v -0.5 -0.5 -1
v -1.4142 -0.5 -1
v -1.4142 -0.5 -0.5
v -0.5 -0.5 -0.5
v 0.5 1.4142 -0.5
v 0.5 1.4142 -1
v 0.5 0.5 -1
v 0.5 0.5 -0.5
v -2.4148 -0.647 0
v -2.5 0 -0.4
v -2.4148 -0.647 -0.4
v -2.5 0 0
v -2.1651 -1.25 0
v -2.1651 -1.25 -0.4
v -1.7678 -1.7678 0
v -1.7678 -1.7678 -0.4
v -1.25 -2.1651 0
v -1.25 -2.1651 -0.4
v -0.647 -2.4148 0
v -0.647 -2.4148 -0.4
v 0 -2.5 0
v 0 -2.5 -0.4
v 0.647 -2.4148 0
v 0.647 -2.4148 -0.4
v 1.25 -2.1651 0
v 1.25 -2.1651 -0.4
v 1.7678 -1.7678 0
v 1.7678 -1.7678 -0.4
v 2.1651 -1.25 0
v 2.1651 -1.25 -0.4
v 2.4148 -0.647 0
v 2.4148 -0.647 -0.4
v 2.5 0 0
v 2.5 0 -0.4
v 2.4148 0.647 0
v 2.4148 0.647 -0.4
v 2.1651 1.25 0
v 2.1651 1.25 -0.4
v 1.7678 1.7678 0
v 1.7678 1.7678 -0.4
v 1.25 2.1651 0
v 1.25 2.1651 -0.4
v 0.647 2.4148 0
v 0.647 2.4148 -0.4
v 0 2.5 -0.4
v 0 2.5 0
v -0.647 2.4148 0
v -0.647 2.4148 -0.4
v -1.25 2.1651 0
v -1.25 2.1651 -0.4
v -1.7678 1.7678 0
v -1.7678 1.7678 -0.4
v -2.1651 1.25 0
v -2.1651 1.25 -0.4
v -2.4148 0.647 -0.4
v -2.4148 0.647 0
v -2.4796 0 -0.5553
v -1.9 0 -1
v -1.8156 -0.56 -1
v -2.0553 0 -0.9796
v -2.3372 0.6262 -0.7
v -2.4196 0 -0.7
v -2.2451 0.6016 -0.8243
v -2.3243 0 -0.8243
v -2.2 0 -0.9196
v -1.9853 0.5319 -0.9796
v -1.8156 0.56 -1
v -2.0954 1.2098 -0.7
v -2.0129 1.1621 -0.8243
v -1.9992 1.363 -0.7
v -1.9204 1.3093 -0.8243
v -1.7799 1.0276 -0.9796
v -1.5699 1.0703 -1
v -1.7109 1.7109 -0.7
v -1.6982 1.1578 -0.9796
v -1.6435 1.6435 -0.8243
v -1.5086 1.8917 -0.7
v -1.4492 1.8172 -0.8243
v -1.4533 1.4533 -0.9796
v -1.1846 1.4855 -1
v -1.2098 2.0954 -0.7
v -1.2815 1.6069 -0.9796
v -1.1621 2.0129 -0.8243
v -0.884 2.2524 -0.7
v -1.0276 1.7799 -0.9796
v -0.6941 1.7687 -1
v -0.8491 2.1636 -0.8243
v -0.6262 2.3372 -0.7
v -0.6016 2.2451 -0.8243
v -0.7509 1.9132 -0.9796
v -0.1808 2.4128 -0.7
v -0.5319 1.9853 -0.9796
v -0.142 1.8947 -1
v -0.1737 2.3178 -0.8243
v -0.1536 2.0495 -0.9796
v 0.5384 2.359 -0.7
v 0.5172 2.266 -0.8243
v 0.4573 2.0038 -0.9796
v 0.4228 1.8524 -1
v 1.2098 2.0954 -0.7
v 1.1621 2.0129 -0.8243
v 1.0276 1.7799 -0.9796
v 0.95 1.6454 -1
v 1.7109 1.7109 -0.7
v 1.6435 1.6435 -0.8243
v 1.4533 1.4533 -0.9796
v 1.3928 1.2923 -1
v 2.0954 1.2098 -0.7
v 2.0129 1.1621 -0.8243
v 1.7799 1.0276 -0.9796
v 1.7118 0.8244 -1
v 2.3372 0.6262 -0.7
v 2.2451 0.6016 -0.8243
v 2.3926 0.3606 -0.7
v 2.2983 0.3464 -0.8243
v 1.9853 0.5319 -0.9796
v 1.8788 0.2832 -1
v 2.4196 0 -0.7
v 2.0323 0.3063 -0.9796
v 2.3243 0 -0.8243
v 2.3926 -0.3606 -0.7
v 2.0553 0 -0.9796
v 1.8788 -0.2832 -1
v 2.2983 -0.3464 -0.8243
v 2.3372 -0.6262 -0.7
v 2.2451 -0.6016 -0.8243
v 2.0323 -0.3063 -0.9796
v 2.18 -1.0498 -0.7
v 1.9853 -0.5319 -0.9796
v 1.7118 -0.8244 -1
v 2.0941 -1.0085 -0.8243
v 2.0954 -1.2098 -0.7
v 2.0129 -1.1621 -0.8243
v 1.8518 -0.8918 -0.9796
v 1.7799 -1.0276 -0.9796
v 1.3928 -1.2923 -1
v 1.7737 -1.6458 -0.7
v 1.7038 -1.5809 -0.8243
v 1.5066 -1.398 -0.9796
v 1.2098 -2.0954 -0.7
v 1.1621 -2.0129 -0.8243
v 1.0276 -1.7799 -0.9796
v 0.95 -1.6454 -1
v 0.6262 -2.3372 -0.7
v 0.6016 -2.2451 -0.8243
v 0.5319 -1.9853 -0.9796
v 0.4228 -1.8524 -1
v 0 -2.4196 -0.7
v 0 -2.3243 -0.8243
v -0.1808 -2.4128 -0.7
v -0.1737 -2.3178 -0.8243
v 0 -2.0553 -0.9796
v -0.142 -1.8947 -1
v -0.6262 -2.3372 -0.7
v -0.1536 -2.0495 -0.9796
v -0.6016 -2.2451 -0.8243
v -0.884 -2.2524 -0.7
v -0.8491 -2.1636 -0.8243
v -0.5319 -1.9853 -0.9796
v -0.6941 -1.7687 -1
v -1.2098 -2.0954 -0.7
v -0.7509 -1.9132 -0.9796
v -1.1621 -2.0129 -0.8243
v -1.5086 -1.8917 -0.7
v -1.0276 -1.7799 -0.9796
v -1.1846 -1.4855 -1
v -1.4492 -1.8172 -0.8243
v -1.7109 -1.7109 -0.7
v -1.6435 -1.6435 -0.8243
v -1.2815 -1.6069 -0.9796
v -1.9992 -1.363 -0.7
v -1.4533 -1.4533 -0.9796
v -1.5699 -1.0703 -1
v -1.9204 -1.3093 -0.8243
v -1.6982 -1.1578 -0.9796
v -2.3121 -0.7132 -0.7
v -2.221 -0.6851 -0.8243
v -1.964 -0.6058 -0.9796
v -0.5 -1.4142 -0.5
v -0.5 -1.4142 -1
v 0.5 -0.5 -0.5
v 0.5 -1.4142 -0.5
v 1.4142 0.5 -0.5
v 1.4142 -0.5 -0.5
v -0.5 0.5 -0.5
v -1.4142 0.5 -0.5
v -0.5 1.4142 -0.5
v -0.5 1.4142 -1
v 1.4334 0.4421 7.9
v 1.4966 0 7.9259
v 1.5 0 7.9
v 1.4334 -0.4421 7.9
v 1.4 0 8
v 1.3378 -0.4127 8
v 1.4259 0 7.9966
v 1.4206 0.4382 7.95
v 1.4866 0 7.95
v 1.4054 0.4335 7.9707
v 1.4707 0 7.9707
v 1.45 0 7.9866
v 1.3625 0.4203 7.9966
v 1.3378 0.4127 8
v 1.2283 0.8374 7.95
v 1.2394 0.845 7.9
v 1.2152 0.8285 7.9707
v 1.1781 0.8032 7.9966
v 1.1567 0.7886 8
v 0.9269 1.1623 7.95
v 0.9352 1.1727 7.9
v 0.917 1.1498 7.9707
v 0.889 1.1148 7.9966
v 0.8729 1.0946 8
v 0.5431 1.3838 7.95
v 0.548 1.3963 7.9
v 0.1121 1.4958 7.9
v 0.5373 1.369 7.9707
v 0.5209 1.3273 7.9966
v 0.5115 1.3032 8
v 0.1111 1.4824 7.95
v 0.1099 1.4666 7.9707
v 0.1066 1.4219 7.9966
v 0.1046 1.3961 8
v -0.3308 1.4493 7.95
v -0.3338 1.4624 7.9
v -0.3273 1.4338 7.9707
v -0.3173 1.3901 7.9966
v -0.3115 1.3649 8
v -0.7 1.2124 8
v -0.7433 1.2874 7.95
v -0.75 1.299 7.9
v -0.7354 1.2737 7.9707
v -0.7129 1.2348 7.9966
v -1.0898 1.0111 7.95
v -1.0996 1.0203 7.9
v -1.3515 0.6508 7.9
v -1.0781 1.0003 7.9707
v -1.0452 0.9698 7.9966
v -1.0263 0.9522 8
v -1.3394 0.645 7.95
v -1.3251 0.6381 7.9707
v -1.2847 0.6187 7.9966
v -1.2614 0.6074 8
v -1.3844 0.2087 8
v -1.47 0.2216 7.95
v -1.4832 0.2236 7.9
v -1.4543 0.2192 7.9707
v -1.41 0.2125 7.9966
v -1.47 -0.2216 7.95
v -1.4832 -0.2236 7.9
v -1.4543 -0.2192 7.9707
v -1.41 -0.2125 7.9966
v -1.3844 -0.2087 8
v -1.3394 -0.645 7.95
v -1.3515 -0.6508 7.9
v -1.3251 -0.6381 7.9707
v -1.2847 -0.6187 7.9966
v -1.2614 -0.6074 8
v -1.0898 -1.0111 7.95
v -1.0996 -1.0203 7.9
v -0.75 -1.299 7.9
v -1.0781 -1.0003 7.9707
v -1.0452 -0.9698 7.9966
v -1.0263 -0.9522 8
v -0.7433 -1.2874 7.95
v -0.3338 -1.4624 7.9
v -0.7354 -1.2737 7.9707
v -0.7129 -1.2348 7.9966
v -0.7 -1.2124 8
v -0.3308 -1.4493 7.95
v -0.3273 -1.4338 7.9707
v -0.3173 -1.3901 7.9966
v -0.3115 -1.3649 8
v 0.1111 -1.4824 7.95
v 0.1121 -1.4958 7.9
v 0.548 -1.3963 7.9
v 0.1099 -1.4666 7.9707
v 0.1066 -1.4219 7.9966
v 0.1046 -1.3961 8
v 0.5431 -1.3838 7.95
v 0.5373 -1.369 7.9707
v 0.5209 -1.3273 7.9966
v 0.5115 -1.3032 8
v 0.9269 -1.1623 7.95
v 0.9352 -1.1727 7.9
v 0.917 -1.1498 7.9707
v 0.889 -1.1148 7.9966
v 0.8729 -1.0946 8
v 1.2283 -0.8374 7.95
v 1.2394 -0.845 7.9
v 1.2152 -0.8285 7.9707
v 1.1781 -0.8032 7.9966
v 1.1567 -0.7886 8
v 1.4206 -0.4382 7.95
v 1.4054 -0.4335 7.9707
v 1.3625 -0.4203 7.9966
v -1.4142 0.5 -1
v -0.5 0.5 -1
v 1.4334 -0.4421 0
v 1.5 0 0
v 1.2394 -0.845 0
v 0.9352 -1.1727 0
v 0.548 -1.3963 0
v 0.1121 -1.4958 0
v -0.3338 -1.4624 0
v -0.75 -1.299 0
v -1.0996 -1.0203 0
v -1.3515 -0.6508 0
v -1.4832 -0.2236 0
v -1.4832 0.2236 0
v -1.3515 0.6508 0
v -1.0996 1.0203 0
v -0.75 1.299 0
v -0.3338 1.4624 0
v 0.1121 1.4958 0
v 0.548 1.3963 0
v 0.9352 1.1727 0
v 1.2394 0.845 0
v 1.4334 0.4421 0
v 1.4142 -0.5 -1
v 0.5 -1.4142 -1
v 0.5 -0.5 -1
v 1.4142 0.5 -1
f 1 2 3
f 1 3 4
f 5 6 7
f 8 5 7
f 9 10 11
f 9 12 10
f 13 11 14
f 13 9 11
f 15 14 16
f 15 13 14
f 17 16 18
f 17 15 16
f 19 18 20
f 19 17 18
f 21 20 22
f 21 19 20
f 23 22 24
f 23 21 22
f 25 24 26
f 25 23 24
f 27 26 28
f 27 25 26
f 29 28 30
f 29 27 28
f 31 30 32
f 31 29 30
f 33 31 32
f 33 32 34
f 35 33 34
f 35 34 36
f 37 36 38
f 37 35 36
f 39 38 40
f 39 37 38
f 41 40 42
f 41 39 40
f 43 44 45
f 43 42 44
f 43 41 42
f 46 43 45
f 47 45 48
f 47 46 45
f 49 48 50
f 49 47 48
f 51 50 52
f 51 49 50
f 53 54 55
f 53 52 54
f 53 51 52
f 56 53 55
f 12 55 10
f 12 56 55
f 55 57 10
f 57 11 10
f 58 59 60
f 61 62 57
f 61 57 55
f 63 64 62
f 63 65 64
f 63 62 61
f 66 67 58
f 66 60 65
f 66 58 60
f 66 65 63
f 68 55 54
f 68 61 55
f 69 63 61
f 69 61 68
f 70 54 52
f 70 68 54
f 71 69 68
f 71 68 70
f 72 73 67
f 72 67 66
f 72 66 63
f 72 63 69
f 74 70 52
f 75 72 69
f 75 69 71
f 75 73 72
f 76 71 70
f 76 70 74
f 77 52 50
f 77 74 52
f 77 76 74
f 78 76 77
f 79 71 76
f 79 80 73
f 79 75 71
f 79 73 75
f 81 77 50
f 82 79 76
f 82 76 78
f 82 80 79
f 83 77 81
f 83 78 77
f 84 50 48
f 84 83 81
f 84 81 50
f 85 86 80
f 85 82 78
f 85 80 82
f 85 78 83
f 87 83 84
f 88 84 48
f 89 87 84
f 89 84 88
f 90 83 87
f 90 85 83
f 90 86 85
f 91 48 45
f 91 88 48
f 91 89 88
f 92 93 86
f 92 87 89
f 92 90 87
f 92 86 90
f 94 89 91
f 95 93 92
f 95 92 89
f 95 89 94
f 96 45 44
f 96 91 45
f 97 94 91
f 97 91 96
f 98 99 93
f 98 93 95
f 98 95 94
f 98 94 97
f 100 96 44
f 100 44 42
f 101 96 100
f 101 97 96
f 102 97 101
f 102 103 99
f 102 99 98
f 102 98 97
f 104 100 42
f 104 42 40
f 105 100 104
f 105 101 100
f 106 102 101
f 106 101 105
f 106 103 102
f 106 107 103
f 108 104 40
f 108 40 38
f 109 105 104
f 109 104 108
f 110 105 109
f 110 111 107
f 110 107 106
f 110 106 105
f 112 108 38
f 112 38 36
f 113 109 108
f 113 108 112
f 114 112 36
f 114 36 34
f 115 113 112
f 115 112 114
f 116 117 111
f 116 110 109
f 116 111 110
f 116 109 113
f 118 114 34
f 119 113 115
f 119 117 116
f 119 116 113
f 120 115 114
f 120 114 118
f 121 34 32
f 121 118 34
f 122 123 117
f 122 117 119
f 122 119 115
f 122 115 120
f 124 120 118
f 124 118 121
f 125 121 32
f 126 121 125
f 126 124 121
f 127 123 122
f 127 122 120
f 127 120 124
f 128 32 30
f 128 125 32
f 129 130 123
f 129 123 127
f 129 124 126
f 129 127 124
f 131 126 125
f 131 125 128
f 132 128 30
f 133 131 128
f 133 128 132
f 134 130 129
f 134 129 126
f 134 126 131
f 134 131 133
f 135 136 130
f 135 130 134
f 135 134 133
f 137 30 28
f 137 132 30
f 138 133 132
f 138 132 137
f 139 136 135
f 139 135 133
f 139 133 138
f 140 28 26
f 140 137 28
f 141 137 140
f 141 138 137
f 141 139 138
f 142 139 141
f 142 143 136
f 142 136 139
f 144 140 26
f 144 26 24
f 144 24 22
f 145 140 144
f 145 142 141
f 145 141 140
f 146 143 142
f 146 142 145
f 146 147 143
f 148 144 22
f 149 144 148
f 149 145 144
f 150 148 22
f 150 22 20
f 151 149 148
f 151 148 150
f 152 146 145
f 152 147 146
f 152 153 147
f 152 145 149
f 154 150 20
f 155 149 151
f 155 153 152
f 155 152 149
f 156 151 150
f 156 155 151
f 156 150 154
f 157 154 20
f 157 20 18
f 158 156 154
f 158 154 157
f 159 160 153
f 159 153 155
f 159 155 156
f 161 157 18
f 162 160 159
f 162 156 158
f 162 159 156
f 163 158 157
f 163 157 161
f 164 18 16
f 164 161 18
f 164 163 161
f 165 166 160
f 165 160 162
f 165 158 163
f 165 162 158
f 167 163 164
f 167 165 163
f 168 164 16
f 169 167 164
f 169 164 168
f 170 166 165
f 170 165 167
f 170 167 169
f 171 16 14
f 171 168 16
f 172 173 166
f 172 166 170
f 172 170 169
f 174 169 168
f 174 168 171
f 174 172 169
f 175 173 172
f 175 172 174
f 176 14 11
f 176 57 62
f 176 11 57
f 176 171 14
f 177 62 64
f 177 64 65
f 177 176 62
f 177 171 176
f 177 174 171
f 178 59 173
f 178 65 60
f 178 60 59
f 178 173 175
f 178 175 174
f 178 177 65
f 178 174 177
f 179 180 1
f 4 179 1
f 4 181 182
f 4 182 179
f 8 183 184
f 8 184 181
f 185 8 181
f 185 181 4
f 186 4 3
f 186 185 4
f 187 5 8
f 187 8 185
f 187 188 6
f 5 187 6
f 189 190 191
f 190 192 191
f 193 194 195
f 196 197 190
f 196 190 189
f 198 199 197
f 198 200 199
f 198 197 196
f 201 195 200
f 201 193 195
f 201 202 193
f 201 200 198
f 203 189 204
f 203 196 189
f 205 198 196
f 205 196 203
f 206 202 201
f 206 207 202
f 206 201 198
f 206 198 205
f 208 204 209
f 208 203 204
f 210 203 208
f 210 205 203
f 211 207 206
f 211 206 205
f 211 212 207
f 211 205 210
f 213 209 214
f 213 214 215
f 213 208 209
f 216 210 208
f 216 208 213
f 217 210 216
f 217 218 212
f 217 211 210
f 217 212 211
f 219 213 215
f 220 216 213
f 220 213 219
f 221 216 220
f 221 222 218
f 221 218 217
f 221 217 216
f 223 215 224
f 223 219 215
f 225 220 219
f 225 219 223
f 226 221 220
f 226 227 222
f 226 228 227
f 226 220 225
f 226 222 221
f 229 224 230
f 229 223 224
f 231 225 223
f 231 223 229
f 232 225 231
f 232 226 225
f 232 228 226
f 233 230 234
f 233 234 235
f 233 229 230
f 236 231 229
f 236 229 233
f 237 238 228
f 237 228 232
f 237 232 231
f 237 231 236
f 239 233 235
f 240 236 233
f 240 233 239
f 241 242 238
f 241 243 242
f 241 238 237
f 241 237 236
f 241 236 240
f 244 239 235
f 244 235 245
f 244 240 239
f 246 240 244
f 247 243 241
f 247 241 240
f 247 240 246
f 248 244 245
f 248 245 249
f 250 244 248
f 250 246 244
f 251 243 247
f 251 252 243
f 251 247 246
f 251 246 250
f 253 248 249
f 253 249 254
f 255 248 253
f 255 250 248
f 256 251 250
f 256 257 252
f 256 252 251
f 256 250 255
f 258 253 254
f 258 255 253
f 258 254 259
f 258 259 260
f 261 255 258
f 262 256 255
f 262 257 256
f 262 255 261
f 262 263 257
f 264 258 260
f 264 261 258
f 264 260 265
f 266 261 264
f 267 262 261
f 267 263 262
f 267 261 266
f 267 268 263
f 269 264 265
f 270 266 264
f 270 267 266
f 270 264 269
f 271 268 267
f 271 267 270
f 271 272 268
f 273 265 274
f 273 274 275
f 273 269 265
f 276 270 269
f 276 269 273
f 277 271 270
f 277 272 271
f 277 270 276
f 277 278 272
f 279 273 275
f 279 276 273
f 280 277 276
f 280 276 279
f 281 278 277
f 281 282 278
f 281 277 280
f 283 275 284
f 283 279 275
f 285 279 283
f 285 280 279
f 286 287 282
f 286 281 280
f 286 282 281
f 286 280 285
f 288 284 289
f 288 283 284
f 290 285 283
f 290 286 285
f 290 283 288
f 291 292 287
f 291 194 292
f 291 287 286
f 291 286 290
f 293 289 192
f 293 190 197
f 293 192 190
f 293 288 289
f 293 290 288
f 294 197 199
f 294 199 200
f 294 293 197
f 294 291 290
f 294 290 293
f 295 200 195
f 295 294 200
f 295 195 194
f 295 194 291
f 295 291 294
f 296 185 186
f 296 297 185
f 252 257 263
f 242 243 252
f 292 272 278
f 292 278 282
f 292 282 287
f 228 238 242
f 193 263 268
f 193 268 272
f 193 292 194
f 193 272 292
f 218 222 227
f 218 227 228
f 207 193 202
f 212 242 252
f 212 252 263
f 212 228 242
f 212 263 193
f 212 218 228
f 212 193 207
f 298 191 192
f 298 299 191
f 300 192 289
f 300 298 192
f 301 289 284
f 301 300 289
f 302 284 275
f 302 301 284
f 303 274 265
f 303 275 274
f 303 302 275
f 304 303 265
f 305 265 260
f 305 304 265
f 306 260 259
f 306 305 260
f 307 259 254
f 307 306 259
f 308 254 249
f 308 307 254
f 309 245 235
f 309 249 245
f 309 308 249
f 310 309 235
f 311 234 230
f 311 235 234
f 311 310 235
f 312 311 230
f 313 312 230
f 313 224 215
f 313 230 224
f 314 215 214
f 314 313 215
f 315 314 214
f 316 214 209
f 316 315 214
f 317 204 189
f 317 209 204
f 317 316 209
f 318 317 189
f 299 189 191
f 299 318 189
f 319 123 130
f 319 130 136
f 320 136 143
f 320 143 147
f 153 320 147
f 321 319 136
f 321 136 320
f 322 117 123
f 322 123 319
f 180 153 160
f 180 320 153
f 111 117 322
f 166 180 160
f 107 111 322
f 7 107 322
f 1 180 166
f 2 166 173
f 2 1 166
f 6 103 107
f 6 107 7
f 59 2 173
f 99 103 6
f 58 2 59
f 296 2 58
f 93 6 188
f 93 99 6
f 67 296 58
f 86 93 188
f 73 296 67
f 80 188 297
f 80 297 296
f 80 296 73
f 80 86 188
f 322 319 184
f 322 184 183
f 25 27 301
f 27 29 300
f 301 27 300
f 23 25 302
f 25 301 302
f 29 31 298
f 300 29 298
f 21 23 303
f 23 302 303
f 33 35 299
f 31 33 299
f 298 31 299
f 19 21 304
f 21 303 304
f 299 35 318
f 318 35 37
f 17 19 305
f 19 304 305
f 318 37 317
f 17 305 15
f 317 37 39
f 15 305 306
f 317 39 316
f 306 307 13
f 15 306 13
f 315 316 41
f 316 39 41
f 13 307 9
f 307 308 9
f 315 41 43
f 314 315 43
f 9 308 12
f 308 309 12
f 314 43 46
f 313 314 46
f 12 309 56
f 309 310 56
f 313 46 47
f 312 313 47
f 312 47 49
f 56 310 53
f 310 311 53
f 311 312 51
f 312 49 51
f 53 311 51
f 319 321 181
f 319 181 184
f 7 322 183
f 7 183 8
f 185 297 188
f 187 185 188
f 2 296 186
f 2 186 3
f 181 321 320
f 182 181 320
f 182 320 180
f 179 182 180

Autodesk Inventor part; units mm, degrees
ref_plane "YZ Plane" through (0, 0, 0) normal (1, 0, 0) x (0, 1, 0)
ref_plane "XZ Plane" through (0, 0, 0) normal (0, 1, 0) x (-1, 0, 0)
ref_plane "XY Plane" through (0, 0, 0) normal (0, 0, 1) x (1, 0, 0)
sketch "Sketch1" plane through (0, 0, 0) normal (0, 0, 1) x (1, 0, 0)
  circle A0 centre (0, 0) radius 1.5
  dimension "d0" = 3
extrude "Extrusion1" add sketch "Sketch1" along normal blind 8
fillet "Fillet1" radius 0.1 1 edges at (-1.5, 0, 8)
sketch "Sketch2" plane through (0, 0, 0) normal (0, 0, -1) x (-1, 0, 0)
  circle A0 centre (0, 0) radius 2.5
  dimension "d4" = 5
extrude "Extrusion2" add sketch "Sketch2" along normal blind 1
sketch "Sketch3" plane through (0, 0, -1) normal (0, 0, -1) x (-1, 0, 0)
  line L0 (-1.4142, 0.5) -> (1.4142, 0.5)
  line L1 (1.4142, 0.5) -> (1.4142, -0.5)
  line L2 (1.4142, -0.5) -> (-1.4142, -0.5)
  line L3 (-1.4142, -0.5) -> (-1.4142, 0.5)
  line L4 (-1.4142, 0.5) -> (1.4142, -0.5) construction
  line L5 (1.4142, 0.5) -> (-1.4142, -0.5) construction
  line L6 (0.5, 1.4142) -> (-0.5, 1.4142)
  line L7 (-0.5, 1.4142) -> (-0.5, -1.4142)
  line L8 (-0.5, -1.4142) -> (0.5, -1.4142)
  line L9 (0.5, -1.4142) -> (0.5, 1.4142)
  line L10 (0.5, 1.4142) -> (-0.5, -1.4142) construction
  line L11 (-0.5, 1.4142) -> (0.5, -1.4142) construction
  point P0 (0, 0)
  point P1 (0, 0)
  point P2 (0, 0)
  dimension "d8" = 1
  dimension "d9" = 1
extrude "Extrusion3" cut sketch "Sketch3" against normal blind 0.5
fillet "Fillet2" radius 0.6 1 edges at (2.5, 0, -1)
properties part number "M3"
